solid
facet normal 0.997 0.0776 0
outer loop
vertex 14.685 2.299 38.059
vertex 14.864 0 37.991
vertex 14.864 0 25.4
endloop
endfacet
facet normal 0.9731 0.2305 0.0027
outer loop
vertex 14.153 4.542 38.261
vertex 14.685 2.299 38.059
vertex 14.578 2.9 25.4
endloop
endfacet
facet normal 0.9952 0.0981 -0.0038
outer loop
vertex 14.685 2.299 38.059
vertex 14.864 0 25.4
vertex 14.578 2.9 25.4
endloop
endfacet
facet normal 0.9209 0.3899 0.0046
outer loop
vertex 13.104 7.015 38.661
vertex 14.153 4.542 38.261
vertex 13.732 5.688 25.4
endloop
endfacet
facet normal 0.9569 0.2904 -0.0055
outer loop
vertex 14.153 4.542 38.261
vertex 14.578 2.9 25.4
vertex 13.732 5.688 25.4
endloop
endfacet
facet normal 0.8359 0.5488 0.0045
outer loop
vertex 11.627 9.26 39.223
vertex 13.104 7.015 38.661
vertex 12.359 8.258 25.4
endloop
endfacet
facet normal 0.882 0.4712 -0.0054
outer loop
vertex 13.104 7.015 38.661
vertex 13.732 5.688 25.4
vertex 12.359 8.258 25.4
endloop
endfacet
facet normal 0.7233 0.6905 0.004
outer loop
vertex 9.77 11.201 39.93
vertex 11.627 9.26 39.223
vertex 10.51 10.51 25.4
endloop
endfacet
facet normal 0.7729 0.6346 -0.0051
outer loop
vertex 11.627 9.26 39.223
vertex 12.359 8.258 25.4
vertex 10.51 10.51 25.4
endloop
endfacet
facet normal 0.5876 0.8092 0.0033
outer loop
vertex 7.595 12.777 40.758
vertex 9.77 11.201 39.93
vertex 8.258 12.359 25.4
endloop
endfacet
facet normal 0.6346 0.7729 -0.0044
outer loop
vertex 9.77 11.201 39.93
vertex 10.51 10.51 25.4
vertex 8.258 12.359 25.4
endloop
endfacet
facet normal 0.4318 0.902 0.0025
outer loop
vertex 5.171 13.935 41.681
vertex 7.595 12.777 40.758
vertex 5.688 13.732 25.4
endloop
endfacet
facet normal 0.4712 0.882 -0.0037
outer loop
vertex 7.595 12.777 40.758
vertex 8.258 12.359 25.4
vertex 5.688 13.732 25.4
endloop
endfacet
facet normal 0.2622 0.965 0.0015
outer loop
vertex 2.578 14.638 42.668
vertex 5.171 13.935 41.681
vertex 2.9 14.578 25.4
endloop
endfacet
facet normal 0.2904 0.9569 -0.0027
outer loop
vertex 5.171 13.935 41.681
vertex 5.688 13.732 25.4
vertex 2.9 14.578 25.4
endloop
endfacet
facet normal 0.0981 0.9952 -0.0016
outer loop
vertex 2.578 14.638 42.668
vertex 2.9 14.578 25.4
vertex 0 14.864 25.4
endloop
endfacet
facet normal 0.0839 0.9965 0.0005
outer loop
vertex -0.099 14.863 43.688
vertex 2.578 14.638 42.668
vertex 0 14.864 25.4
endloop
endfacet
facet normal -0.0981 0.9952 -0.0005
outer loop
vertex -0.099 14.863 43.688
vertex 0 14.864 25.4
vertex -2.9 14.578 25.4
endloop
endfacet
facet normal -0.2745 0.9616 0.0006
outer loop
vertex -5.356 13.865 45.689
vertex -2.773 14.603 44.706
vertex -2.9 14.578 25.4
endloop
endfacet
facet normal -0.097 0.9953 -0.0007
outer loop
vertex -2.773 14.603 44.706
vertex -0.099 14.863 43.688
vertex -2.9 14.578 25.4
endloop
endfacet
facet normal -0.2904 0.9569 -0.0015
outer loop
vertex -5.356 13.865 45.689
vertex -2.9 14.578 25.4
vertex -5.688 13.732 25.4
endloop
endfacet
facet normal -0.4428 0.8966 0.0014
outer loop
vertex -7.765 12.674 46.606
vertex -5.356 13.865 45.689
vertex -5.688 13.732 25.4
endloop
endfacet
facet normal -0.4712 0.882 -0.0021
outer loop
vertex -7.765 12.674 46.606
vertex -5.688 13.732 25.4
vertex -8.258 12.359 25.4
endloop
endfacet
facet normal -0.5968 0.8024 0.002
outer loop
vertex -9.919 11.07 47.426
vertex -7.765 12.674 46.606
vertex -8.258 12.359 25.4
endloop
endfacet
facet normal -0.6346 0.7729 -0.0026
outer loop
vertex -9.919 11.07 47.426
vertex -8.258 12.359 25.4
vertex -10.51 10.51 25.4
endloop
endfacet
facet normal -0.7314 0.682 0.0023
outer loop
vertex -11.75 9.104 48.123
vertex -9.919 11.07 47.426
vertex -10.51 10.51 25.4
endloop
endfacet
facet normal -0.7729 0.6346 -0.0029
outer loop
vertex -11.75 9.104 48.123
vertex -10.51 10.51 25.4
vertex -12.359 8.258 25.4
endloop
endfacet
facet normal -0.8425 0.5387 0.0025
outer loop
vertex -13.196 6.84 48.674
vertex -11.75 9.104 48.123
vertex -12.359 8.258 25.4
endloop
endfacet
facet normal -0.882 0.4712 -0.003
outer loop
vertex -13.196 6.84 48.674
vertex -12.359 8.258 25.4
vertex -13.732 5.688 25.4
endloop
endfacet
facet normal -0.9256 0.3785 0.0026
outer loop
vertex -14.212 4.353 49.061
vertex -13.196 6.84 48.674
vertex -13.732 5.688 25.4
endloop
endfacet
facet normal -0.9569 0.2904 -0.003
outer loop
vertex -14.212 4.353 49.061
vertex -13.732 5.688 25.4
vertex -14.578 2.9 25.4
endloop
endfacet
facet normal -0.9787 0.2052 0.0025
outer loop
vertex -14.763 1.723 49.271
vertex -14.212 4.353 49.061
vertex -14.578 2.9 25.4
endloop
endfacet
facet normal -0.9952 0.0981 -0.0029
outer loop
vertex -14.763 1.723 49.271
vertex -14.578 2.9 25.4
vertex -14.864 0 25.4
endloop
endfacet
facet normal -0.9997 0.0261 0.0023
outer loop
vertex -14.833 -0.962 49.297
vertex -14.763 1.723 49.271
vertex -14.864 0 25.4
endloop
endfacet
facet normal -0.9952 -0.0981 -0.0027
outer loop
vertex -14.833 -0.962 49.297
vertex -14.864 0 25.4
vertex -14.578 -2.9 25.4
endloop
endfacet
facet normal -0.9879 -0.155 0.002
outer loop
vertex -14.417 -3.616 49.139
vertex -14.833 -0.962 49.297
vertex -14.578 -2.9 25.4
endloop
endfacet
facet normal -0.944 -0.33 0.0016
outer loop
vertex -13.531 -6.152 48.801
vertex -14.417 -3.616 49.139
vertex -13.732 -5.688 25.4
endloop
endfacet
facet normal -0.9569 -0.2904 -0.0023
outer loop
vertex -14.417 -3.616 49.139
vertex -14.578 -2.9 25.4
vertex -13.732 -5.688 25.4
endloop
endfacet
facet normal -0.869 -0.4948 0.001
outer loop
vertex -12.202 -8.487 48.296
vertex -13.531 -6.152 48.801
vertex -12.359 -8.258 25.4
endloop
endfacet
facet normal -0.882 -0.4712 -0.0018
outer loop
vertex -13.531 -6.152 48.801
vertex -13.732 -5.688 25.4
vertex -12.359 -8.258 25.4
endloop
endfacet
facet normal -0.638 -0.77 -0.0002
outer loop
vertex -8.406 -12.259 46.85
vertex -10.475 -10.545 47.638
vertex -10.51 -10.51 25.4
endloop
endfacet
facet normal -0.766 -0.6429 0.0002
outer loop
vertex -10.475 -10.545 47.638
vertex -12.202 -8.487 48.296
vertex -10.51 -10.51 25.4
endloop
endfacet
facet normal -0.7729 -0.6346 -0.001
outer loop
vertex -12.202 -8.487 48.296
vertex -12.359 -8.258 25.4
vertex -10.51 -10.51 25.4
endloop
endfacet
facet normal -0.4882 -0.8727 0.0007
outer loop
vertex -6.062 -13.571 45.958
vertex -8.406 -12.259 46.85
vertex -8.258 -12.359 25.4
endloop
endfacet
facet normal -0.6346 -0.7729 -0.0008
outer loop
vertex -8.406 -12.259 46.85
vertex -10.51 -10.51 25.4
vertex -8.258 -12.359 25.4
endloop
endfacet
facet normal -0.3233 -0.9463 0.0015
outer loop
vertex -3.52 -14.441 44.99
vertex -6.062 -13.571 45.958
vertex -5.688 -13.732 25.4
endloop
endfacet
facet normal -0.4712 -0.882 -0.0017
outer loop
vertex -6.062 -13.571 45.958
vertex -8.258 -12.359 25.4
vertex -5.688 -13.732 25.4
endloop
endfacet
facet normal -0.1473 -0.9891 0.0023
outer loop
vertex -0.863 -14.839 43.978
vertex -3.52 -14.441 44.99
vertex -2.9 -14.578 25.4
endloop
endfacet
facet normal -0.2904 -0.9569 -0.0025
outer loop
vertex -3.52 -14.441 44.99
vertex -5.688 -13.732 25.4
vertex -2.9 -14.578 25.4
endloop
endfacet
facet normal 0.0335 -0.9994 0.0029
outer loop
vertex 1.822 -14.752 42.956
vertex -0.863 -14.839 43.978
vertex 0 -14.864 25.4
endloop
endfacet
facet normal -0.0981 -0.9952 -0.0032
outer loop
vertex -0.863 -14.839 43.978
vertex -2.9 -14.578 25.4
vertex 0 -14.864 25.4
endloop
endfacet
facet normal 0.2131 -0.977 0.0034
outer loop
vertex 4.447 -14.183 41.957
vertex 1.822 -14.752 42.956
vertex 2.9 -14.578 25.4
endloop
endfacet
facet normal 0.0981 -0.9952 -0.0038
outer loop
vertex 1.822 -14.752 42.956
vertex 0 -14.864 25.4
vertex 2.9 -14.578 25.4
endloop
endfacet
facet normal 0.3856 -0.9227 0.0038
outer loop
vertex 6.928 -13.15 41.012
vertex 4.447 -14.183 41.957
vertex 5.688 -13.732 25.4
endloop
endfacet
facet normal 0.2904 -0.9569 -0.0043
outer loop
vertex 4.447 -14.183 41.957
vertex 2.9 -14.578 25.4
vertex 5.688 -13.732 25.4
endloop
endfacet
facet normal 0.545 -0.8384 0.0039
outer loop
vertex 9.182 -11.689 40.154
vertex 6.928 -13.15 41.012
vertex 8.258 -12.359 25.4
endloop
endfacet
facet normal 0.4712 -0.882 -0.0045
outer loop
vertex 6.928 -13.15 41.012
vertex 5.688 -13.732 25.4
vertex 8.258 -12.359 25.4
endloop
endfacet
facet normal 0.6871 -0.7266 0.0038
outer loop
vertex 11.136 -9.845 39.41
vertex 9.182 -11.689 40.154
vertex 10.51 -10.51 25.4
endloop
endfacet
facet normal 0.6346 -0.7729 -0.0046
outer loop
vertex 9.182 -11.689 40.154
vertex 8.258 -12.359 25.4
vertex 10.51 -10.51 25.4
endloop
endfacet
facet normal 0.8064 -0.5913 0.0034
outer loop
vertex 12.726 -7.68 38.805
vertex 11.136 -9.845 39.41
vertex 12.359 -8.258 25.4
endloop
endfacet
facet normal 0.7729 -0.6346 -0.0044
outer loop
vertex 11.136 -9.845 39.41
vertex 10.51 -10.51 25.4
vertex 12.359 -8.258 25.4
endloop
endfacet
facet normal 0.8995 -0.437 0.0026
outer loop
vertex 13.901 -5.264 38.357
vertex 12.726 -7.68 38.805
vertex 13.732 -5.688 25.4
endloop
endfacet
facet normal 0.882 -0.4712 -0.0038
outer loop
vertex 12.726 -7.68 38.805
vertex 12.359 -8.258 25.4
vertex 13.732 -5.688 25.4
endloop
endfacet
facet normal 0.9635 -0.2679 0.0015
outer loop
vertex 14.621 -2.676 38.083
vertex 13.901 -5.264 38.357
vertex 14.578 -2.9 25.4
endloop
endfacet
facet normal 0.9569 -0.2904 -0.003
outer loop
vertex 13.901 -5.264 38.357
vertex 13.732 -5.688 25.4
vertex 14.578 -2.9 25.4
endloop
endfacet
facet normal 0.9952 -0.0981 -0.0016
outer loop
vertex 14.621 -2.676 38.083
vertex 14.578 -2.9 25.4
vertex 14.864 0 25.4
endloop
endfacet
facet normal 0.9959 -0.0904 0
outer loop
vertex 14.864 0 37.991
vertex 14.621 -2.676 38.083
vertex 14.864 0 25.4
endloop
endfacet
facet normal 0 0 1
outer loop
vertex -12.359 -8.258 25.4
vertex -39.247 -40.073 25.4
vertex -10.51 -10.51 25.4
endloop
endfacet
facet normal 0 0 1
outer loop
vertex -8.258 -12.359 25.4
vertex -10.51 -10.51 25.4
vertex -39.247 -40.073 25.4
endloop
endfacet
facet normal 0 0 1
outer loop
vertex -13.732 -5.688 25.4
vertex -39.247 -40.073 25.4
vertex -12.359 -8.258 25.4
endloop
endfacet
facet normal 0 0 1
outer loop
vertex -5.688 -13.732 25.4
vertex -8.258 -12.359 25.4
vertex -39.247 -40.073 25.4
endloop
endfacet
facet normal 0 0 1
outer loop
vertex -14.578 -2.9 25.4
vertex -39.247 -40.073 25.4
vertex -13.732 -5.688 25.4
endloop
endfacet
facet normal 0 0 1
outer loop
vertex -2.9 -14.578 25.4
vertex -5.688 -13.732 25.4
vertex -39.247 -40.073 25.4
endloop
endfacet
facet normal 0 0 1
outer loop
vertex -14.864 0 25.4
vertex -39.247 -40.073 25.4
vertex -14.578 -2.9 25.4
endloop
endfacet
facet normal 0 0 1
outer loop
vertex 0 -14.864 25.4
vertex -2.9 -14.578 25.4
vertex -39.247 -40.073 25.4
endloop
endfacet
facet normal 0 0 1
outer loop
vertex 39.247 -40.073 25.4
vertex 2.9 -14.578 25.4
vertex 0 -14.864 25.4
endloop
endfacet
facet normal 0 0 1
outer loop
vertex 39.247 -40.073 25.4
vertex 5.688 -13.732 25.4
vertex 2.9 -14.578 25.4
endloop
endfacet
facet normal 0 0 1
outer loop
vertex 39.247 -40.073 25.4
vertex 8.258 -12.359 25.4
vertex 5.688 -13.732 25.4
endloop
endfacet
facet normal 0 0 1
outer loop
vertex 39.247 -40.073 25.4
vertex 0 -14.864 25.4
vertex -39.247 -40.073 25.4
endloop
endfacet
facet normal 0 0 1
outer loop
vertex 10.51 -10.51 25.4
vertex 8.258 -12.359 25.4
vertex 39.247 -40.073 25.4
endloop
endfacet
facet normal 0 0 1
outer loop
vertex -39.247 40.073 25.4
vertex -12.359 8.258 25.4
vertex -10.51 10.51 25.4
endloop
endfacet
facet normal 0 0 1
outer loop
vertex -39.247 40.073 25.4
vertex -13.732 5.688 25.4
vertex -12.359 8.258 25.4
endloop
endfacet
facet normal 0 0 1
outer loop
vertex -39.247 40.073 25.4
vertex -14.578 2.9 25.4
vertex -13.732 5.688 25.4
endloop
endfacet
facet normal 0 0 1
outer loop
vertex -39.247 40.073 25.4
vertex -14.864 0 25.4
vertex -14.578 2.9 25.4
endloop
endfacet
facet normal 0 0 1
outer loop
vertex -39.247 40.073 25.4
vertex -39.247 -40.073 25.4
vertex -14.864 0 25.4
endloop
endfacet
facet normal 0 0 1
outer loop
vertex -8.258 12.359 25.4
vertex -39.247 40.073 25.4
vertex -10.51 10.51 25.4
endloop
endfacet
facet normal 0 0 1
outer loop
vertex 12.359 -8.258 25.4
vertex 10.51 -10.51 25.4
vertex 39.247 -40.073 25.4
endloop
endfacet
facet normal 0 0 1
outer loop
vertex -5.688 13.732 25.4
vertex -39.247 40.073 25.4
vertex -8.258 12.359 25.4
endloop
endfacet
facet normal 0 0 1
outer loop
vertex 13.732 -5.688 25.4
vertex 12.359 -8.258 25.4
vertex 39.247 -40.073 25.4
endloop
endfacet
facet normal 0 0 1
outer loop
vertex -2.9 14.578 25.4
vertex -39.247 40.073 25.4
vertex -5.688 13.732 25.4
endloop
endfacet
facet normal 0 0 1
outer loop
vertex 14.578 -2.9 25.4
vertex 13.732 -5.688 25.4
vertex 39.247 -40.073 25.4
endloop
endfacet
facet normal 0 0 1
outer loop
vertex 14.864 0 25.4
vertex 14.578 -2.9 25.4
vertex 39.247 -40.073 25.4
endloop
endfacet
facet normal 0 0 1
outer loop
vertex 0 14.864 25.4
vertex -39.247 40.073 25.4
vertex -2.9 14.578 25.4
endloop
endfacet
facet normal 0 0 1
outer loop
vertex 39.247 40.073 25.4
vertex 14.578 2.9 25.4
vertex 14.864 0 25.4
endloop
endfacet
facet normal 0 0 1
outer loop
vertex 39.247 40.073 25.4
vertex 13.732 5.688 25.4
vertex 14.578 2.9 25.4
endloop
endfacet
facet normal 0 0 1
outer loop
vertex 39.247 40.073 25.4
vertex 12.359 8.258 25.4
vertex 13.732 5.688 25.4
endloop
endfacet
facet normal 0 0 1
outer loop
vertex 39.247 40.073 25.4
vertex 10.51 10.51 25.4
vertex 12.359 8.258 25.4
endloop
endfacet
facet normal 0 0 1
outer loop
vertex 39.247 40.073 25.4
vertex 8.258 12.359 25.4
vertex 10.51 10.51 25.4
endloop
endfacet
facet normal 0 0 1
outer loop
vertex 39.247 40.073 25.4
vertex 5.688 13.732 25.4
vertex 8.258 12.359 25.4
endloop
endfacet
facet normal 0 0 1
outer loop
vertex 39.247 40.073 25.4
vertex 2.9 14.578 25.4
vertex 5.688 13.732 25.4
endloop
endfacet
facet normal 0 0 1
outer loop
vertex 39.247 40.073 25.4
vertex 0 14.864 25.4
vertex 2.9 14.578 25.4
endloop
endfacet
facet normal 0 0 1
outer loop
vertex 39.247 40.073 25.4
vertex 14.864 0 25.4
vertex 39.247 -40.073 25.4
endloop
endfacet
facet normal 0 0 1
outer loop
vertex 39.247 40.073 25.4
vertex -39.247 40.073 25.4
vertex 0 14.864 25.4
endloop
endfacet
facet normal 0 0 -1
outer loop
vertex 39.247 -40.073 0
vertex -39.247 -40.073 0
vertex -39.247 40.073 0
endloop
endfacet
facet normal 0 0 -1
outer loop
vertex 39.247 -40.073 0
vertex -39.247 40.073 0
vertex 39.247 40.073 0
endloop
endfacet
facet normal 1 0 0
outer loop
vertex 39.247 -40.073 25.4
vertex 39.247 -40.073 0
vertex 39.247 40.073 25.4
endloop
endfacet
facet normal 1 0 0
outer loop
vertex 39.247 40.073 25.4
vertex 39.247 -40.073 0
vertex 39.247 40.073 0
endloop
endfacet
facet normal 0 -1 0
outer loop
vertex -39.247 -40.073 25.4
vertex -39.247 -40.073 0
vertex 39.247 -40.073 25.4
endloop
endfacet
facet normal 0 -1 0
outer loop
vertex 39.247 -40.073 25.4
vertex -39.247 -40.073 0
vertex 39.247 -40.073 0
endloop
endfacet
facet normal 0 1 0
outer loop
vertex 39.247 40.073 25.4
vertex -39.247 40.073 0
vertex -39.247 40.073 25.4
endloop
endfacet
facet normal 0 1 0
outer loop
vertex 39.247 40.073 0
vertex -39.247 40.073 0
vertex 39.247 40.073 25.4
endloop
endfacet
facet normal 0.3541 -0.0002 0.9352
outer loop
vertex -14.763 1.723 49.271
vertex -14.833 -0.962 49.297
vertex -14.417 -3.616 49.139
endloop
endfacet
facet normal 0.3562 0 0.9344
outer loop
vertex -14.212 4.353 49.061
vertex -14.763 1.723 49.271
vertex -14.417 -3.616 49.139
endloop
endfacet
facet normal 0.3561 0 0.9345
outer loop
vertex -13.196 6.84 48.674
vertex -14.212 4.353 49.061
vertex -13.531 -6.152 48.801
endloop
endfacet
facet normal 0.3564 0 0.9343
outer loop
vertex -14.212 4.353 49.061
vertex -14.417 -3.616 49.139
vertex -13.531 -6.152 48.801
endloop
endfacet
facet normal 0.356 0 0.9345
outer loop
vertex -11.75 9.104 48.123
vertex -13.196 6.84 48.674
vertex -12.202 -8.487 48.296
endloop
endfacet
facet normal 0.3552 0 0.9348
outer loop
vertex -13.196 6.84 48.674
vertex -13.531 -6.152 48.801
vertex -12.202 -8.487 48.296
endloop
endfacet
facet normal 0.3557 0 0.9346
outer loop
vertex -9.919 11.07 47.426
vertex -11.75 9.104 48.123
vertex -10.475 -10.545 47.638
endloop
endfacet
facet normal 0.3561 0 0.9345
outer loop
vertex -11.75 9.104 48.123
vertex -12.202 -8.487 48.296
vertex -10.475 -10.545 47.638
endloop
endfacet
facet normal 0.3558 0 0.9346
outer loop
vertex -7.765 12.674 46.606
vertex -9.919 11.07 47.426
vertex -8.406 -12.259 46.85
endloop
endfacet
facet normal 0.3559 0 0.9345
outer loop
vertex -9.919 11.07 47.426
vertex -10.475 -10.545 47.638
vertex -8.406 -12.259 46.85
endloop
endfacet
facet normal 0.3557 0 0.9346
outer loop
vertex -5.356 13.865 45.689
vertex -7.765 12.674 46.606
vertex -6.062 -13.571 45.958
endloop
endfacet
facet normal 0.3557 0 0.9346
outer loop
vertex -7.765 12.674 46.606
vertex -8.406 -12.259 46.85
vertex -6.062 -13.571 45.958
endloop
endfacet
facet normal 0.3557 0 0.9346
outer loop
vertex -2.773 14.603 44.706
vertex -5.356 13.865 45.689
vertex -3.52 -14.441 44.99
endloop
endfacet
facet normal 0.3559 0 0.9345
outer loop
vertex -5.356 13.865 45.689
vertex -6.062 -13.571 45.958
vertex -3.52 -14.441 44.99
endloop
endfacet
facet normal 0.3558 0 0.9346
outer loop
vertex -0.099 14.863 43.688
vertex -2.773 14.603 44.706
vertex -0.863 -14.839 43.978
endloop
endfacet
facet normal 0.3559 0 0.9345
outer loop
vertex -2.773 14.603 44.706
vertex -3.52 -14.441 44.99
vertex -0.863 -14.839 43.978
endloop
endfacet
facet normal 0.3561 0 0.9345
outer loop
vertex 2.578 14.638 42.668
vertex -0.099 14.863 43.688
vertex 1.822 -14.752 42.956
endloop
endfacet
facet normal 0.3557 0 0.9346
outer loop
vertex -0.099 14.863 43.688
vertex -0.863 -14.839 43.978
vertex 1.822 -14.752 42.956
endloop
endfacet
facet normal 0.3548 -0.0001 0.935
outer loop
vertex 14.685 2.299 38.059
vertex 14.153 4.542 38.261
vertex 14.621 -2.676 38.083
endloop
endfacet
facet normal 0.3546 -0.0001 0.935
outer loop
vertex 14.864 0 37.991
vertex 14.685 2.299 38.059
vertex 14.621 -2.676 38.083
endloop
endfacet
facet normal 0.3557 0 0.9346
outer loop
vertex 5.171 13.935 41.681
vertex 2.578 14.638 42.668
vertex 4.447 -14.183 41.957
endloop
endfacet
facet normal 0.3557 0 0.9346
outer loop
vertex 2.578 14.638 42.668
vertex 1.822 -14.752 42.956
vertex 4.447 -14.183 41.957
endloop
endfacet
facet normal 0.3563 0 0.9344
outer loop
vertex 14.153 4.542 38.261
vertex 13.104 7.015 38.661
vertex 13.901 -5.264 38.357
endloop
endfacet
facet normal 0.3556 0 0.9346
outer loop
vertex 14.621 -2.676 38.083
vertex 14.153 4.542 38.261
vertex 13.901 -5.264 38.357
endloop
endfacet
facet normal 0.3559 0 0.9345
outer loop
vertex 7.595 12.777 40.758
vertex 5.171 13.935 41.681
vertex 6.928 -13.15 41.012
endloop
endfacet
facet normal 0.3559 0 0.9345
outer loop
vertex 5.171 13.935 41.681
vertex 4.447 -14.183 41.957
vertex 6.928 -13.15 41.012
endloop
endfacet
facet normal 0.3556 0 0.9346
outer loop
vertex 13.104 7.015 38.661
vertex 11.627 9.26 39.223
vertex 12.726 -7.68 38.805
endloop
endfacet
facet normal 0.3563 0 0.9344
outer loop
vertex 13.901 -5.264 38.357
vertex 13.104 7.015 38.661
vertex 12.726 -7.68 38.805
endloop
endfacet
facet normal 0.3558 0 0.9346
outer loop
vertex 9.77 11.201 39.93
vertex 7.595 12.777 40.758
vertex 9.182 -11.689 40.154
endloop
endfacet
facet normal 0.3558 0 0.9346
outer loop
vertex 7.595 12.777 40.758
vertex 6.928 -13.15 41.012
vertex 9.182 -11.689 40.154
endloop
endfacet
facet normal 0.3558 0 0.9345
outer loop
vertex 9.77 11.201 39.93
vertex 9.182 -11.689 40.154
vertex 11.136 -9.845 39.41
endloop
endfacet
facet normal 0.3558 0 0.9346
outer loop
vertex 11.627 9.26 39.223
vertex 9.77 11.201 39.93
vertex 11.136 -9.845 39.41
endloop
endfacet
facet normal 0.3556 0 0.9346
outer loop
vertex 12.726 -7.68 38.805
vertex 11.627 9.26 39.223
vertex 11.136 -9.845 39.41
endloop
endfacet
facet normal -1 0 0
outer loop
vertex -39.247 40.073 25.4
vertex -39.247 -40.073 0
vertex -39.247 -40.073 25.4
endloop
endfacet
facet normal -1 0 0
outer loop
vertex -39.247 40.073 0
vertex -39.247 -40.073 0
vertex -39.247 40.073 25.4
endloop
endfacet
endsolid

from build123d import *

# Parameters (mm, degrees)
F0_W     = 78.4944
F0_H     = 80.146916
F1_DEPTH = 25.4
F2_R     = 14.863696
F3_DEPTH = 25.4
F5_DEPTH = 21.336


with BuildPart() as f1:
    # F0 (on Top) → F1 (new body)
    with BuildSketch(Plane.XY):
        Rectangle(F0_W, F0_H)
    extrude(amount=F1_DEPTH)

    # F2 (on face) → F3 (join)
    with BuildSketch(Plane.XY.offset(25.4)):
        Circle(F2_R)
    extrude(amount=F3_DEPTH)

    # F4 (on Front) → F5 (cut, symmetric)
    with BuildSketch(Plane.XZ):
        Polygon((26.566675, 57.633717), (-36.728796, 57.633717), (26.566675, 33.534981), align=None)
    extrude(amount=F5_DEPTH, both=True, mode=Mode.SUBTRACT)


solid = f1.part
